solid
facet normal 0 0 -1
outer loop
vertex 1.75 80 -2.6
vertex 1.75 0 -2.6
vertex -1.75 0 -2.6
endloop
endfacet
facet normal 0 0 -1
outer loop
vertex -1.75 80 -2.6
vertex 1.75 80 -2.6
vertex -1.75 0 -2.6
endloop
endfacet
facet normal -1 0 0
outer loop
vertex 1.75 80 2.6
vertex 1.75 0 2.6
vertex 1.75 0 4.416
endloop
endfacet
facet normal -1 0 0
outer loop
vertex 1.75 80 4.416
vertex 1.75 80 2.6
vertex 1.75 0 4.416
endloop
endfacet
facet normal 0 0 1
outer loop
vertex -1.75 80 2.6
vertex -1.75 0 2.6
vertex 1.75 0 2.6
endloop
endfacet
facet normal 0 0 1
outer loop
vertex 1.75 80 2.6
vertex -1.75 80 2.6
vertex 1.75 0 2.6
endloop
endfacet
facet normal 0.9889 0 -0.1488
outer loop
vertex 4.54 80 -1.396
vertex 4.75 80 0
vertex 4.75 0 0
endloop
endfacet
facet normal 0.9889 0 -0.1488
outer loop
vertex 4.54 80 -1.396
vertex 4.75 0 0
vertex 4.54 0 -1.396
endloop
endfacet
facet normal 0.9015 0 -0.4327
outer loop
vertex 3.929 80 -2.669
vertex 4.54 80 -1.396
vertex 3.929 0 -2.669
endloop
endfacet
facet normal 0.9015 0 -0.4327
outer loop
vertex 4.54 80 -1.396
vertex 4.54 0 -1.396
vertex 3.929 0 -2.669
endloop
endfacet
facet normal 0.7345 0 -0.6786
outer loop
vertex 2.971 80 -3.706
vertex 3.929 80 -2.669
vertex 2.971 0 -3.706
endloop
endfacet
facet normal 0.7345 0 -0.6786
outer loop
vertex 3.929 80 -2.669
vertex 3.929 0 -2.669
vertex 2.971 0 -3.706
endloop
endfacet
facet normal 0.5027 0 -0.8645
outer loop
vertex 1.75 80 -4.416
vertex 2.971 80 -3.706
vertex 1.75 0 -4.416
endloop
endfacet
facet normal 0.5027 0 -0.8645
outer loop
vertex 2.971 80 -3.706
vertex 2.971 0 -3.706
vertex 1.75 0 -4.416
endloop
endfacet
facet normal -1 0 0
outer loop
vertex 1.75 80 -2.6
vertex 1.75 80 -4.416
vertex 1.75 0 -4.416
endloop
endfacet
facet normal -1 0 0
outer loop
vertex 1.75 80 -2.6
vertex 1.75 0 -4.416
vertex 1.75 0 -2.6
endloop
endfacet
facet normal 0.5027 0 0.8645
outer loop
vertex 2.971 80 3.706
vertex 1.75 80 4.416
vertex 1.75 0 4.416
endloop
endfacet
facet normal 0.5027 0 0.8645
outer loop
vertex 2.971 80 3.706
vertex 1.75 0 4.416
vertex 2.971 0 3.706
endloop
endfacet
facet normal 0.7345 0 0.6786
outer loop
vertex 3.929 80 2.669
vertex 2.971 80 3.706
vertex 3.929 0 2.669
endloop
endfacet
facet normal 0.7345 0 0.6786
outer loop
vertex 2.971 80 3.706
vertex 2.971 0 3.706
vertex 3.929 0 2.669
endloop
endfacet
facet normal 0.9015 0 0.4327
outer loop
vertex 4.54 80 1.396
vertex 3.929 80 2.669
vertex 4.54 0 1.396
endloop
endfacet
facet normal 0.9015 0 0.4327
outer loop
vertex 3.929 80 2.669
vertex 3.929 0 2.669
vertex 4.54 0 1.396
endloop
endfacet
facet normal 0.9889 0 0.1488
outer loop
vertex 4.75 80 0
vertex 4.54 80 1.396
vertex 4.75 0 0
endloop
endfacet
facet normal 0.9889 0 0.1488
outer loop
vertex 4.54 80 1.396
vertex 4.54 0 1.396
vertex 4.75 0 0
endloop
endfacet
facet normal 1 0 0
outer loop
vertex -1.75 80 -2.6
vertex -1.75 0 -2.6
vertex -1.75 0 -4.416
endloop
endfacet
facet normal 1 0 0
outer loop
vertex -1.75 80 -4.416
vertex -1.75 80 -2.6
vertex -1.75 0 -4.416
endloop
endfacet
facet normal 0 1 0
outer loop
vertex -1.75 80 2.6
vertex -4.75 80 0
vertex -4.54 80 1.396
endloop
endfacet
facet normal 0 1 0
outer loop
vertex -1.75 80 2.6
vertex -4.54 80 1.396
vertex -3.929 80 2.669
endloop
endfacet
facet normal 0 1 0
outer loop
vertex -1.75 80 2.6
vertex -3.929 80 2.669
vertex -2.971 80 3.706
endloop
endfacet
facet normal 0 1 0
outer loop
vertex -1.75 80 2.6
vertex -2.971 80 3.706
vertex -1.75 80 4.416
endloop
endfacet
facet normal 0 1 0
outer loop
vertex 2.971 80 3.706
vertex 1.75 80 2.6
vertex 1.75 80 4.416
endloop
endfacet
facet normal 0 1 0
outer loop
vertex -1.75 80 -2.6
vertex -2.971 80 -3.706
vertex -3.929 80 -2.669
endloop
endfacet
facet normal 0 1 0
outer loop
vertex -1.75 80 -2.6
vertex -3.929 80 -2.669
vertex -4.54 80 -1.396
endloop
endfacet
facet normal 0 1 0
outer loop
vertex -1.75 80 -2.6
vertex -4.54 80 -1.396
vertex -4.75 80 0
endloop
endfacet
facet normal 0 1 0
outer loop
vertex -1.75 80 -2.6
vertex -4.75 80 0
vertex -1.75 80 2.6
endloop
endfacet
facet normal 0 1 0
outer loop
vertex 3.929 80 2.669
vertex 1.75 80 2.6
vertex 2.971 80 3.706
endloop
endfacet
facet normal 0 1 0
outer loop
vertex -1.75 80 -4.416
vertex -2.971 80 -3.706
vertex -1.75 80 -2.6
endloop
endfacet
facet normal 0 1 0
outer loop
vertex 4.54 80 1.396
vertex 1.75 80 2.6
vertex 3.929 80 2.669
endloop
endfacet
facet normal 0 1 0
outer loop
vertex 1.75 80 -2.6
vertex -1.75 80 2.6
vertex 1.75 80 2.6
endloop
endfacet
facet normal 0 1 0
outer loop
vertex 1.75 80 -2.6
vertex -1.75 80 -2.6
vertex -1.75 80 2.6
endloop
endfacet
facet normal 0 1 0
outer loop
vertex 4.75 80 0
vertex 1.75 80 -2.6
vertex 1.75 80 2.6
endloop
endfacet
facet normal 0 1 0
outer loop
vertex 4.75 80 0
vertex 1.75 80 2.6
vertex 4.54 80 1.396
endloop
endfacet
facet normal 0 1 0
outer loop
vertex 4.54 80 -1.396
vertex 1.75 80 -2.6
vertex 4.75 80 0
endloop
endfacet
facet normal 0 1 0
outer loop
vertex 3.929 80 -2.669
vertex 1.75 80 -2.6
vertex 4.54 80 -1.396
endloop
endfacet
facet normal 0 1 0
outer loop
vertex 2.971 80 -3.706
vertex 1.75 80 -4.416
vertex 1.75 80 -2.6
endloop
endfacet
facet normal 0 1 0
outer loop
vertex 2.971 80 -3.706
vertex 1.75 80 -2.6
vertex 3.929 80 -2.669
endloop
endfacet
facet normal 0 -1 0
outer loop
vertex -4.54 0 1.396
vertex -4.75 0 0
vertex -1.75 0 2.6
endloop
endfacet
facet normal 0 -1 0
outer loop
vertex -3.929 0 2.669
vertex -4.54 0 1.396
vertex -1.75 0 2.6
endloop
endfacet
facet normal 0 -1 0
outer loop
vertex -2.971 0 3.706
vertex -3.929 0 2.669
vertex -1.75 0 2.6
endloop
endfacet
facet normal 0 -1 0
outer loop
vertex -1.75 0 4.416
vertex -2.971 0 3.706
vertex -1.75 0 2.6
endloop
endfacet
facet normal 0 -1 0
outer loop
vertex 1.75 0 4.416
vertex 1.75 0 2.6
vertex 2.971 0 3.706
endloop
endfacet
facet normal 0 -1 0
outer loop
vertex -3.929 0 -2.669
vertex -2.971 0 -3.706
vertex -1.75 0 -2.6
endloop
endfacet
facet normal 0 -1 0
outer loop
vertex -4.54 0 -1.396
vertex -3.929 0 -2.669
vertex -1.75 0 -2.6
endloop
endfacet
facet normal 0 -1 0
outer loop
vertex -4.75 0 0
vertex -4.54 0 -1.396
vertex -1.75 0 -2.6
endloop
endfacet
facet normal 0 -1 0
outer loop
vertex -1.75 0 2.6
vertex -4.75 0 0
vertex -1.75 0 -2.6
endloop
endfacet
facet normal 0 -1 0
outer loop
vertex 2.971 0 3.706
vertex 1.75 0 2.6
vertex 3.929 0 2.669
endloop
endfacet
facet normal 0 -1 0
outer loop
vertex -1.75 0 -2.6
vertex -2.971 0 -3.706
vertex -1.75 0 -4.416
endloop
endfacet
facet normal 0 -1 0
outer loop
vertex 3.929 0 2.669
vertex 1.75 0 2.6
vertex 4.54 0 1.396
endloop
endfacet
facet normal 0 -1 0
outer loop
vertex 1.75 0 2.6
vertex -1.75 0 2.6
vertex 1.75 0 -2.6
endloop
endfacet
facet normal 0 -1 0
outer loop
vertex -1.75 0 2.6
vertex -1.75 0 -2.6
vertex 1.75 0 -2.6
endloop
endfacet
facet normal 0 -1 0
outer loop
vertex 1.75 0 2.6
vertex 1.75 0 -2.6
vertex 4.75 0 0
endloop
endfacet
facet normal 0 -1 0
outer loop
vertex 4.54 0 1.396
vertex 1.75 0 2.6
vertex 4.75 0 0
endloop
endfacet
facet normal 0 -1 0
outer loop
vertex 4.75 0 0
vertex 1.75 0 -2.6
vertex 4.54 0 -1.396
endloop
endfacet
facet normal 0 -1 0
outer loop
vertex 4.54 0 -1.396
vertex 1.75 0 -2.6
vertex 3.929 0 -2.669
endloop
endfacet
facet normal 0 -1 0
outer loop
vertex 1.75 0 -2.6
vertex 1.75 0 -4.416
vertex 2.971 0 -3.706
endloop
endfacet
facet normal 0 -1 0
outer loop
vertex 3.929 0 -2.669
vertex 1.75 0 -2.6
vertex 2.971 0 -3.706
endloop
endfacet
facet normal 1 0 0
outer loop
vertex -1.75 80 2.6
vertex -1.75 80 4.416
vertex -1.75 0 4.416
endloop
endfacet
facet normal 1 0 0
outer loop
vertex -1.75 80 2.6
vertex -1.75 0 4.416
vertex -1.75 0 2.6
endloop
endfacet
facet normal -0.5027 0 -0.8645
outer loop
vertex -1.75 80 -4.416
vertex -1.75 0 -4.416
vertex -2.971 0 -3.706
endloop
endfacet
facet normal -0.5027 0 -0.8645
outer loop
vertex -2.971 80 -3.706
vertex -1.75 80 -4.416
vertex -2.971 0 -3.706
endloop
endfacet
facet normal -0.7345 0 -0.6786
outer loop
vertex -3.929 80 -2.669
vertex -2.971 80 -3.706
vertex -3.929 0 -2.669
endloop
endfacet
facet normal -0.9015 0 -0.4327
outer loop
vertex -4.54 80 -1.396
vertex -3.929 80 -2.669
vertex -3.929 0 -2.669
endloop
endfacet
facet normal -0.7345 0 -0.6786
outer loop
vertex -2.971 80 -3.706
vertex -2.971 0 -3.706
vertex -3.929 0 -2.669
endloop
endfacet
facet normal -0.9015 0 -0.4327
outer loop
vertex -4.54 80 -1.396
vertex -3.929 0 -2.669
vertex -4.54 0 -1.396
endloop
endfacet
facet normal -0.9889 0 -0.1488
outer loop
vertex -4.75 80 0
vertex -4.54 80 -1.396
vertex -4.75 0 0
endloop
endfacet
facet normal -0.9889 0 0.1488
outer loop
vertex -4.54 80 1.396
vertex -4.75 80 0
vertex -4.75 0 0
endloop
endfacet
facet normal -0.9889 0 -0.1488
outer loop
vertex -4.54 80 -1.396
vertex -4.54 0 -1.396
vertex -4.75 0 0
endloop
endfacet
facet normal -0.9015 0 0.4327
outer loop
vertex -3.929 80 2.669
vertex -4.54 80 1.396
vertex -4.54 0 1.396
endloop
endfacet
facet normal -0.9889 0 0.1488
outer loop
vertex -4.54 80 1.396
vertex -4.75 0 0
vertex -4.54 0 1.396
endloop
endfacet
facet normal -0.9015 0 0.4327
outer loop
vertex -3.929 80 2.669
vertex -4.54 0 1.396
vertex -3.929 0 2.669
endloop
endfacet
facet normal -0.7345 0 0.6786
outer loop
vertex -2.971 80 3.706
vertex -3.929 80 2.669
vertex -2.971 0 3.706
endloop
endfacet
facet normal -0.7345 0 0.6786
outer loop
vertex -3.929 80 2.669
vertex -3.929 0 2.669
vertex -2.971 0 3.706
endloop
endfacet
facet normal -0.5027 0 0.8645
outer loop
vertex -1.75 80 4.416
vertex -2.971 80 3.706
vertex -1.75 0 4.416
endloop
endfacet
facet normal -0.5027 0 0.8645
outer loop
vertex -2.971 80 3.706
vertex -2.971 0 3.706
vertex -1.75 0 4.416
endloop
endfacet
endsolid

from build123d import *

# Parameters (mm, degrees)
BOSS_EXTRUDE1_DEPTH = 80


with BuildPart() as part:
    # Sketch1 → Boss-Extrude1 (new body)
    with BuildSketch(Plane(origin=(0, 0, 0), x_dir=(1, 0, 0), z_dir=(0, 1, 0))):
        with BuildLine():
            Line((-1.75, 2.6), (-1.75, 4.415880433))
            ThreePointArc((-1.75, 4.415880433), (-4.75, 0), (-1.75, -4.415880433))
            Line((-1.75, -4.415880433), (-1.75, -2.6))
            Line((-1.75, -2.6), (1.75, -2.6))
            Line((1.75, -2.6), (1.75, -4.415880433))
            ThreePointArc((1.75, -4.415880433), (3.929058411, -2.669269563), (4.75, 0))
            ThreePointArc((4.75, 0), (3.929058411, 2.669269563), (1.75, 4.415880433))
            Line((1.75, 4.415880433), (1.75, 2.6))
            Line((1.75, 2.6), (-1.75, 2.6))
        make_face()
    extrude(amount=BOSS_EXTRUDE1_DEPTH)


solid = part.part
